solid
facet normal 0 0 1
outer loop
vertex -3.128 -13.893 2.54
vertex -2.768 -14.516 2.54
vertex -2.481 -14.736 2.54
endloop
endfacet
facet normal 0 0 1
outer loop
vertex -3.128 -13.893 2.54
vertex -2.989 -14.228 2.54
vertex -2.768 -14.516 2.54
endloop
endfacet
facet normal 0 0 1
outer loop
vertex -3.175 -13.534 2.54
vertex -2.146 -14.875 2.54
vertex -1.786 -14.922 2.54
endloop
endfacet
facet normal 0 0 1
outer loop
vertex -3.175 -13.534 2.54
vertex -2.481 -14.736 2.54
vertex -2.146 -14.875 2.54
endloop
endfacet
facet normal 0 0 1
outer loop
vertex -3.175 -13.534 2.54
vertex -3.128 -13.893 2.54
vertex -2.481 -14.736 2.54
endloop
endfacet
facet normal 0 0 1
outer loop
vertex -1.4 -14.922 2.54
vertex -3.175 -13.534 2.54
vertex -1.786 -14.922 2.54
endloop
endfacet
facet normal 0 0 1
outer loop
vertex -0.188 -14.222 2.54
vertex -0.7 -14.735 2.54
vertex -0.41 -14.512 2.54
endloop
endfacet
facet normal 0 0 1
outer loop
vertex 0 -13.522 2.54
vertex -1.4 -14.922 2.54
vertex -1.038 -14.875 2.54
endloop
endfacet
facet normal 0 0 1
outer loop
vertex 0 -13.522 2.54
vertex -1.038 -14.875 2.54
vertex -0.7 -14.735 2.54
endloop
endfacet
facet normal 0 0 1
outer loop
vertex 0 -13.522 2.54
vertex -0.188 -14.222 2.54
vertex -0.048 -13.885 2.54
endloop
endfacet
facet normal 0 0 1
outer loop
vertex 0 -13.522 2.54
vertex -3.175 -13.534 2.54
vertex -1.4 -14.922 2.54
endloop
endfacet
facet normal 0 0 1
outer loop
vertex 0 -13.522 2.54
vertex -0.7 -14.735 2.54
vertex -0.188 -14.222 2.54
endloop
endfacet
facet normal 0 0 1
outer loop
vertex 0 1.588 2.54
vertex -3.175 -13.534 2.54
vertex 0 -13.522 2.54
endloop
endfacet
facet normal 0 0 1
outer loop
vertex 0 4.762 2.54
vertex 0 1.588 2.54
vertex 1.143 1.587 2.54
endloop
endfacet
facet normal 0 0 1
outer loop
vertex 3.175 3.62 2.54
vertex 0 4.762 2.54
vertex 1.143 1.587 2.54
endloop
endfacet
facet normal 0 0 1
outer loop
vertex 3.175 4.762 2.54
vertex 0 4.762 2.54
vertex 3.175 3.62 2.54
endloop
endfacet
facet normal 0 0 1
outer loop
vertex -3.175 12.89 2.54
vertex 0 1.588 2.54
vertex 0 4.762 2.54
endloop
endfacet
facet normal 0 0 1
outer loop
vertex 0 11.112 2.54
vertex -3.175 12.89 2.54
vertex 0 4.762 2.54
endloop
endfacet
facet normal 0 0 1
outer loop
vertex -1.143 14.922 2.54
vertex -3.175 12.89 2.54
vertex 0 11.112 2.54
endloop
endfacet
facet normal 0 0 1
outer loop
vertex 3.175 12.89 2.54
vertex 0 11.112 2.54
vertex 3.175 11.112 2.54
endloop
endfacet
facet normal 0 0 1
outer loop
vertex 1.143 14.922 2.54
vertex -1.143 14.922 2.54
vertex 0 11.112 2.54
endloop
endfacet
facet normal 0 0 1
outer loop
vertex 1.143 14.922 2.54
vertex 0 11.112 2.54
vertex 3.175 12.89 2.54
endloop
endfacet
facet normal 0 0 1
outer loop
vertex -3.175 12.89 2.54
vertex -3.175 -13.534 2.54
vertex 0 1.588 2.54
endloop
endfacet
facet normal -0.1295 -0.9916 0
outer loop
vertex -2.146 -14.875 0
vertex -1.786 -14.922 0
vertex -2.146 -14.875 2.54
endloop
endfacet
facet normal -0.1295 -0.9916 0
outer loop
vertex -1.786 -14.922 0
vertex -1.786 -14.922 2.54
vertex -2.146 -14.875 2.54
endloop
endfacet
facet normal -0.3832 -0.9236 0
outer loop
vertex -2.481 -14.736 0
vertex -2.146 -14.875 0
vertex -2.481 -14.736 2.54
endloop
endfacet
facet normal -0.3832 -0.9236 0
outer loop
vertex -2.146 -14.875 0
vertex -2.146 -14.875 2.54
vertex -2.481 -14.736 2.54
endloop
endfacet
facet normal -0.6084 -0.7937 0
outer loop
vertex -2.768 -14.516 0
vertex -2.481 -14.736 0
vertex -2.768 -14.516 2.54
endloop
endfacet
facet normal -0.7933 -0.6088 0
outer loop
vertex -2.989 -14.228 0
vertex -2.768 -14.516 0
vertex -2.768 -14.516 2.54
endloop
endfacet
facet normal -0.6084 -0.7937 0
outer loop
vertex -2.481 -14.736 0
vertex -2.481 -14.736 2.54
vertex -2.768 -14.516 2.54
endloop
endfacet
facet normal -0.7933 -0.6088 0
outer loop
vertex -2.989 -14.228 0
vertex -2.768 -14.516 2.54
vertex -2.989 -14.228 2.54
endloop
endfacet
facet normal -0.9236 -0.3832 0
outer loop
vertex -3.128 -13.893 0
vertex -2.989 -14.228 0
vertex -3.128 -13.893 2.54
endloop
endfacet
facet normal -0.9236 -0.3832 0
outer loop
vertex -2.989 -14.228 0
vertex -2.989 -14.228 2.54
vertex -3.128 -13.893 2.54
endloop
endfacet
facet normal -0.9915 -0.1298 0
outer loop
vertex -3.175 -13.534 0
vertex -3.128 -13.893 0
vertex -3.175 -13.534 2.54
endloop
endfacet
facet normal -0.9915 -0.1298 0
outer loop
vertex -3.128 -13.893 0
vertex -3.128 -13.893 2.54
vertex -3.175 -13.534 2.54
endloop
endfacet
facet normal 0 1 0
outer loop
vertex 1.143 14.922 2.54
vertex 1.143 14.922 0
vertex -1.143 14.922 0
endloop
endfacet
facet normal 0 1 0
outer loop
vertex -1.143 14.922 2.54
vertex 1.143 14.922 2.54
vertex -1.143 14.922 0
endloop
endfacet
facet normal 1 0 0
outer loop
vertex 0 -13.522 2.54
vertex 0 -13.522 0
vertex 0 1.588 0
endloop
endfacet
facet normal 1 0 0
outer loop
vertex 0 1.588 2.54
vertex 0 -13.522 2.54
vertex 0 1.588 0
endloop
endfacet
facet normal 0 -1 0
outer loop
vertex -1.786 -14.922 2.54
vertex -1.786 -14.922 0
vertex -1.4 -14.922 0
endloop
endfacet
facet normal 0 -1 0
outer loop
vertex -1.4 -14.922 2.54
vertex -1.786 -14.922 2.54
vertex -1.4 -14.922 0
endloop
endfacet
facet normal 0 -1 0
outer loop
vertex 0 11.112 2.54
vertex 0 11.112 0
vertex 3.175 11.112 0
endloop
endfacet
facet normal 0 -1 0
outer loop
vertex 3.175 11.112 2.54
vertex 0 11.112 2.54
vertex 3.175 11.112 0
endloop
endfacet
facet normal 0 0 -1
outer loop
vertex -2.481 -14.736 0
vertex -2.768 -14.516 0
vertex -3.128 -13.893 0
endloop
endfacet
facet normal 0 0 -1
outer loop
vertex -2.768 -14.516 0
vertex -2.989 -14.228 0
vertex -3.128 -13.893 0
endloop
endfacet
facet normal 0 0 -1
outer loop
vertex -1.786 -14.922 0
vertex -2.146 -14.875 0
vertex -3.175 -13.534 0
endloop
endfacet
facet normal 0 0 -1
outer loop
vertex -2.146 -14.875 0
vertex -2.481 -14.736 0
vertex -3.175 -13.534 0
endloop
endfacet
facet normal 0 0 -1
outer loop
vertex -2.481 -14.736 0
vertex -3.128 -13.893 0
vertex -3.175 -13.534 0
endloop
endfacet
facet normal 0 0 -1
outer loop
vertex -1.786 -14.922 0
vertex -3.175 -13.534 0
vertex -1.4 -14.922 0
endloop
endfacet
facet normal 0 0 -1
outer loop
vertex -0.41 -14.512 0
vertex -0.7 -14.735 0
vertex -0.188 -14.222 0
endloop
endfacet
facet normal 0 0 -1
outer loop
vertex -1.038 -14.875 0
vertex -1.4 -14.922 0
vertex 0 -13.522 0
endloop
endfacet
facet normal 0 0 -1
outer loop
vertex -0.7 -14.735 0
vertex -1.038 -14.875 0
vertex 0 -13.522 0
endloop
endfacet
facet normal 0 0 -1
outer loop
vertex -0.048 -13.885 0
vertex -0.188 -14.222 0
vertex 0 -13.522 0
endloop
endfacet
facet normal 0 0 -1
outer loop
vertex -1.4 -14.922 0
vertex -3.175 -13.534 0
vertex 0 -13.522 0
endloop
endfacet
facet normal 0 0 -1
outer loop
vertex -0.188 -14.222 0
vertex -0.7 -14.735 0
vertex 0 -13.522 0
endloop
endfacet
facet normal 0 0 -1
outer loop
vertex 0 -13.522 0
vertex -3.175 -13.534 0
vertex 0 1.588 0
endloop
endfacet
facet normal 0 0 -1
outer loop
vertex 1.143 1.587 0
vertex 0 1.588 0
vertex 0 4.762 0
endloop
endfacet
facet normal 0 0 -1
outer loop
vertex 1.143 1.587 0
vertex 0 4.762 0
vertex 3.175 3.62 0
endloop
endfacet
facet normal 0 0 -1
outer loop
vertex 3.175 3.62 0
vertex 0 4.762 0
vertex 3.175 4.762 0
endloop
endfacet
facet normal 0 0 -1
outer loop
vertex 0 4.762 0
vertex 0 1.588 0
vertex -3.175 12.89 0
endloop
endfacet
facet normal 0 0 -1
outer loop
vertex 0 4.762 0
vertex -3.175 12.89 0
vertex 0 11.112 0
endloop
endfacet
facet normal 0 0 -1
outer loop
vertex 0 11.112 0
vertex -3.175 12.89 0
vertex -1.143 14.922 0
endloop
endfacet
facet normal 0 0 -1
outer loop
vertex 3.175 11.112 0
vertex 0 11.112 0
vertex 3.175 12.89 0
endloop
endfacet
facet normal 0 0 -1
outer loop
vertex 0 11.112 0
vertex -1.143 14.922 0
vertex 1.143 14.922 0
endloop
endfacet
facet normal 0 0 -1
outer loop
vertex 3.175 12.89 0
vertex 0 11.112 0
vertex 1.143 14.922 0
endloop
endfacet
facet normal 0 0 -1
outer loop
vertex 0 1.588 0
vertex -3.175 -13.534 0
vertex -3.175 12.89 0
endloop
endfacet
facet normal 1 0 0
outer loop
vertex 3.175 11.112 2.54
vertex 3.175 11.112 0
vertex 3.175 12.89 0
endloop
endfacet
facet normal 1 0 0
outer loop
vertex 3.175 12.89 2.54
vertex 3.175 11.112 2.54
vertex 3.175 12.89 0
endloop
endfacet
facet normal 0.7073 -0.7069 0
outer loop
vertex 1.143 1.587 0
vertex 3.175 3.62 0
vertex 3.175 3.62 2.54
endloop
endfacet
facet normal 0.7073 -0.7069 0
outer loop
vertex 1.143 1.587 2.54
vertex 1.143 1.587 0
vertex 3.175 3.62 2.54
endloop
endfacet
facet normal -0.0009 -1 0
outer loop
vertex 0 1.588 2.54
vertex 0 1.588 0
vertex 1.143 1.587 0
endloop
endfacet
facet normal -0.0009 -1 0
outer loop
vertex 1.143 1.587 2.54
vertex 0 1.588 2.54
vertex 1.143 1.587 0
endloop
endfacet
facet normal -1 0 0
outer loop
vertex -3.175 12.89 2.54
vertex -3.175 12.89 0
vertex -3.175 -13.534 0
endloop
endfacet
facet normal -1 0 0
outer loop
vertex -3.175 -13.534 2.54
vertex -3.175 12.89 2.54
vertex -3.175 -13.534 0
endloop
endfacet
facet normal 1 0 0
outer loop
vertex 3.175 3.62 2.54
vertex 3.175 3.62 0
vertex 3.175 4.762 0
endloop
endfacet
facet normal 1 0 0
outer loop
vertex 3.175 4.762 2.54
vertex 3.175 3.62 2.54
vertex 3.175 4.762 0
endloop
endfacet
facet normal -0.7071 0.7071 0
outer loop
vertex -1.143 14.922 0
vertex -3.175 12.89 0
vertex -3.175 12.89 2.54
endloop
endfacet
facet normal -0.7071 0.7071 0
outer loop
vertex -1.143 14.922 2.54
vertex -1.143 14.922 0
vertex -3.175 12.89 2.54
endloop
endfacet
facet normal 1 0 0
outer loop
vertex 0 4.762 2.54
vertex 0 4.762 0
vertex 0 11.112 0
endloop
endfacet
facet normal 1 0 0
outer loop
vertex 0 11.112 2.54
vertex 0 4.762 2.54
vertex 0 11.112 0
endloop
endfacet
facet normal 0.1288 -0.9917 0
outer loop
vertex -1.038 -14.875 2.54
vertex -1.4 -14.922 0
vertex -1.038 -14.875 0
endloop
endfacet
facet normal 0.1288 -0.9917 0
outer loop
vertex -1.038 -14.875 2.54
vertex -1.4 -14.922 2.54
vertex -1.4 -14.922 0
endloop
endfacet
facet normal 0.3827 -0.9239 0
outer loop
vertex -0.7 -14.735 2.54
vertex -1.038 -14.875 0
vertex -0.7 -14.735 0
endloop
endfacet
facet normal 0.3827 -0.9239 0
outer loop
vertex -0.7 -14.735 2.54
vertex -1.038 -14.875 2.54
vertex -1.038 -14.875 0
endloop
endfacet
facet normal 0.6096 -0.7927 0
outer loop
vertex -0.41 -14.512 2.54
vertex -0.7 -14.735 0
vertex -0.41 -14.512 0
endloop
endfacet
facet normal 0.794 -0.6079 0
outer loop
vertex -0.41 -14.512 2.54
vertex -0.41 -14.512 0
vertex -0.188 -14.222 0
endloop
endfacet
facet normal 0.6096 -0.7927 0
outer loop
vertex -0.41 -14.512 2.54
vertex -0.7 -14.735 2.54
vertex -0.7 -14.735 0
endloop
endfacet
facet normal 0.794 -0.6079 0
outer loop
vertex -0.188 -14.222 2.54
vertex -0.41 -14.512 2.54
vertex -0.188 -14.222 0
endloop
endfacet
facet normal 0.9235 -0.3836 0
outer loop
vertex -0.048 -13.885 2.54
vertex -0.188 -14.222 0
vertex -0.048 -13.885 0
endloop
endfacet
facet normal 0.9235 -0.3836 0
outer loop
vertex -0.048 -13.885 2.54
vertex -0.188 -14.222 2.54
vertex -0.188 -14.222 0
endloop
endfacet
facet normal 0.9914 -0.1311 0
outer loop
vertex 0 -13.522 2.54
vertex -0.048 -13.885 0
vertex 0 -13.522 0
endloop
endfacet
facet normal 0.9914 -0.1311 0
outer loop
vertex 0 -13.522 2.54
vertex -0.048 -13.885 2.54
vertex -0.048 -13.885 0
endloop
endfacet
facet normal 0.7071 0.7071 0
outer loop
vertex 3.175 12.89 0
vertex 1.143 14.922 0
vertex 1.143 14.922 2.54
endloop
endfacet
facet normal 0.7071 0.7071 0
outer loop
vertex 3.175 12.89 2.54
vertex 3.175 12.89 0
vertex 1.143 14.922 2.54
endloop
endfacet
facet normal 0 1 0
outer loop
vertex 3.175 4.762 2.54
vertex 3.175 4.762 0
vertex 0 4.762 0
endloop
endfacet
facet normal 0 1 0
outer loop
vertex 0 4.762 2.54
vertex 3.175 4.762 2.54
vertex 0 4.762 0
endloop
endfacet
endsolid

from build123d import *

# Parameters (mm, degrees)
F1_DEPTH = 2.54
F2_SIZE  = 2.032
F3_R     = 1.400292
F4_R     = 1.388776


with BuildPart() as f1:
    # F0 (on Top) → F1 (new body)
    with BuildSketch(Plane.XY):
        Polygon((3.175, 11.1125), (3.175, 14.9225), (-3.175, 14.9225), (-3.175, -14.9225), (0, -14.9225), (0, 1.5875), (3.175, 1.5875), (3.175, 4.7625), (0, 4.7625), (0, 11.1125), align=None)
    extrude(amount=F1_DEPTH)

    # F2
    f2_edges = [f1.edges().sort_by_distance(p)[0] for p in [
        (3.175, 1.5875, 1.27),
        (3.175, 14.9225, 1.27),
        (-3.175, 14.9225, 1.27),
    ]]
    chamfer(f2_edges, length=F2_SIZE)

    # F3
    f3_edges = [f1.edges().sort_by_distance(p)[0] for p in [
        (0, -14.9225, 1.27),
    ]]
    fillet(f3_edges, radius=F3_R)

    # F4
    f4_edges = [f1.edges().sort_by_distance(p)[0] for p in [
        (-3.175, -14.9225, 1.27),
    ]]
    fillet(f4_edges, radius=F4_R)


solid = f1.part
